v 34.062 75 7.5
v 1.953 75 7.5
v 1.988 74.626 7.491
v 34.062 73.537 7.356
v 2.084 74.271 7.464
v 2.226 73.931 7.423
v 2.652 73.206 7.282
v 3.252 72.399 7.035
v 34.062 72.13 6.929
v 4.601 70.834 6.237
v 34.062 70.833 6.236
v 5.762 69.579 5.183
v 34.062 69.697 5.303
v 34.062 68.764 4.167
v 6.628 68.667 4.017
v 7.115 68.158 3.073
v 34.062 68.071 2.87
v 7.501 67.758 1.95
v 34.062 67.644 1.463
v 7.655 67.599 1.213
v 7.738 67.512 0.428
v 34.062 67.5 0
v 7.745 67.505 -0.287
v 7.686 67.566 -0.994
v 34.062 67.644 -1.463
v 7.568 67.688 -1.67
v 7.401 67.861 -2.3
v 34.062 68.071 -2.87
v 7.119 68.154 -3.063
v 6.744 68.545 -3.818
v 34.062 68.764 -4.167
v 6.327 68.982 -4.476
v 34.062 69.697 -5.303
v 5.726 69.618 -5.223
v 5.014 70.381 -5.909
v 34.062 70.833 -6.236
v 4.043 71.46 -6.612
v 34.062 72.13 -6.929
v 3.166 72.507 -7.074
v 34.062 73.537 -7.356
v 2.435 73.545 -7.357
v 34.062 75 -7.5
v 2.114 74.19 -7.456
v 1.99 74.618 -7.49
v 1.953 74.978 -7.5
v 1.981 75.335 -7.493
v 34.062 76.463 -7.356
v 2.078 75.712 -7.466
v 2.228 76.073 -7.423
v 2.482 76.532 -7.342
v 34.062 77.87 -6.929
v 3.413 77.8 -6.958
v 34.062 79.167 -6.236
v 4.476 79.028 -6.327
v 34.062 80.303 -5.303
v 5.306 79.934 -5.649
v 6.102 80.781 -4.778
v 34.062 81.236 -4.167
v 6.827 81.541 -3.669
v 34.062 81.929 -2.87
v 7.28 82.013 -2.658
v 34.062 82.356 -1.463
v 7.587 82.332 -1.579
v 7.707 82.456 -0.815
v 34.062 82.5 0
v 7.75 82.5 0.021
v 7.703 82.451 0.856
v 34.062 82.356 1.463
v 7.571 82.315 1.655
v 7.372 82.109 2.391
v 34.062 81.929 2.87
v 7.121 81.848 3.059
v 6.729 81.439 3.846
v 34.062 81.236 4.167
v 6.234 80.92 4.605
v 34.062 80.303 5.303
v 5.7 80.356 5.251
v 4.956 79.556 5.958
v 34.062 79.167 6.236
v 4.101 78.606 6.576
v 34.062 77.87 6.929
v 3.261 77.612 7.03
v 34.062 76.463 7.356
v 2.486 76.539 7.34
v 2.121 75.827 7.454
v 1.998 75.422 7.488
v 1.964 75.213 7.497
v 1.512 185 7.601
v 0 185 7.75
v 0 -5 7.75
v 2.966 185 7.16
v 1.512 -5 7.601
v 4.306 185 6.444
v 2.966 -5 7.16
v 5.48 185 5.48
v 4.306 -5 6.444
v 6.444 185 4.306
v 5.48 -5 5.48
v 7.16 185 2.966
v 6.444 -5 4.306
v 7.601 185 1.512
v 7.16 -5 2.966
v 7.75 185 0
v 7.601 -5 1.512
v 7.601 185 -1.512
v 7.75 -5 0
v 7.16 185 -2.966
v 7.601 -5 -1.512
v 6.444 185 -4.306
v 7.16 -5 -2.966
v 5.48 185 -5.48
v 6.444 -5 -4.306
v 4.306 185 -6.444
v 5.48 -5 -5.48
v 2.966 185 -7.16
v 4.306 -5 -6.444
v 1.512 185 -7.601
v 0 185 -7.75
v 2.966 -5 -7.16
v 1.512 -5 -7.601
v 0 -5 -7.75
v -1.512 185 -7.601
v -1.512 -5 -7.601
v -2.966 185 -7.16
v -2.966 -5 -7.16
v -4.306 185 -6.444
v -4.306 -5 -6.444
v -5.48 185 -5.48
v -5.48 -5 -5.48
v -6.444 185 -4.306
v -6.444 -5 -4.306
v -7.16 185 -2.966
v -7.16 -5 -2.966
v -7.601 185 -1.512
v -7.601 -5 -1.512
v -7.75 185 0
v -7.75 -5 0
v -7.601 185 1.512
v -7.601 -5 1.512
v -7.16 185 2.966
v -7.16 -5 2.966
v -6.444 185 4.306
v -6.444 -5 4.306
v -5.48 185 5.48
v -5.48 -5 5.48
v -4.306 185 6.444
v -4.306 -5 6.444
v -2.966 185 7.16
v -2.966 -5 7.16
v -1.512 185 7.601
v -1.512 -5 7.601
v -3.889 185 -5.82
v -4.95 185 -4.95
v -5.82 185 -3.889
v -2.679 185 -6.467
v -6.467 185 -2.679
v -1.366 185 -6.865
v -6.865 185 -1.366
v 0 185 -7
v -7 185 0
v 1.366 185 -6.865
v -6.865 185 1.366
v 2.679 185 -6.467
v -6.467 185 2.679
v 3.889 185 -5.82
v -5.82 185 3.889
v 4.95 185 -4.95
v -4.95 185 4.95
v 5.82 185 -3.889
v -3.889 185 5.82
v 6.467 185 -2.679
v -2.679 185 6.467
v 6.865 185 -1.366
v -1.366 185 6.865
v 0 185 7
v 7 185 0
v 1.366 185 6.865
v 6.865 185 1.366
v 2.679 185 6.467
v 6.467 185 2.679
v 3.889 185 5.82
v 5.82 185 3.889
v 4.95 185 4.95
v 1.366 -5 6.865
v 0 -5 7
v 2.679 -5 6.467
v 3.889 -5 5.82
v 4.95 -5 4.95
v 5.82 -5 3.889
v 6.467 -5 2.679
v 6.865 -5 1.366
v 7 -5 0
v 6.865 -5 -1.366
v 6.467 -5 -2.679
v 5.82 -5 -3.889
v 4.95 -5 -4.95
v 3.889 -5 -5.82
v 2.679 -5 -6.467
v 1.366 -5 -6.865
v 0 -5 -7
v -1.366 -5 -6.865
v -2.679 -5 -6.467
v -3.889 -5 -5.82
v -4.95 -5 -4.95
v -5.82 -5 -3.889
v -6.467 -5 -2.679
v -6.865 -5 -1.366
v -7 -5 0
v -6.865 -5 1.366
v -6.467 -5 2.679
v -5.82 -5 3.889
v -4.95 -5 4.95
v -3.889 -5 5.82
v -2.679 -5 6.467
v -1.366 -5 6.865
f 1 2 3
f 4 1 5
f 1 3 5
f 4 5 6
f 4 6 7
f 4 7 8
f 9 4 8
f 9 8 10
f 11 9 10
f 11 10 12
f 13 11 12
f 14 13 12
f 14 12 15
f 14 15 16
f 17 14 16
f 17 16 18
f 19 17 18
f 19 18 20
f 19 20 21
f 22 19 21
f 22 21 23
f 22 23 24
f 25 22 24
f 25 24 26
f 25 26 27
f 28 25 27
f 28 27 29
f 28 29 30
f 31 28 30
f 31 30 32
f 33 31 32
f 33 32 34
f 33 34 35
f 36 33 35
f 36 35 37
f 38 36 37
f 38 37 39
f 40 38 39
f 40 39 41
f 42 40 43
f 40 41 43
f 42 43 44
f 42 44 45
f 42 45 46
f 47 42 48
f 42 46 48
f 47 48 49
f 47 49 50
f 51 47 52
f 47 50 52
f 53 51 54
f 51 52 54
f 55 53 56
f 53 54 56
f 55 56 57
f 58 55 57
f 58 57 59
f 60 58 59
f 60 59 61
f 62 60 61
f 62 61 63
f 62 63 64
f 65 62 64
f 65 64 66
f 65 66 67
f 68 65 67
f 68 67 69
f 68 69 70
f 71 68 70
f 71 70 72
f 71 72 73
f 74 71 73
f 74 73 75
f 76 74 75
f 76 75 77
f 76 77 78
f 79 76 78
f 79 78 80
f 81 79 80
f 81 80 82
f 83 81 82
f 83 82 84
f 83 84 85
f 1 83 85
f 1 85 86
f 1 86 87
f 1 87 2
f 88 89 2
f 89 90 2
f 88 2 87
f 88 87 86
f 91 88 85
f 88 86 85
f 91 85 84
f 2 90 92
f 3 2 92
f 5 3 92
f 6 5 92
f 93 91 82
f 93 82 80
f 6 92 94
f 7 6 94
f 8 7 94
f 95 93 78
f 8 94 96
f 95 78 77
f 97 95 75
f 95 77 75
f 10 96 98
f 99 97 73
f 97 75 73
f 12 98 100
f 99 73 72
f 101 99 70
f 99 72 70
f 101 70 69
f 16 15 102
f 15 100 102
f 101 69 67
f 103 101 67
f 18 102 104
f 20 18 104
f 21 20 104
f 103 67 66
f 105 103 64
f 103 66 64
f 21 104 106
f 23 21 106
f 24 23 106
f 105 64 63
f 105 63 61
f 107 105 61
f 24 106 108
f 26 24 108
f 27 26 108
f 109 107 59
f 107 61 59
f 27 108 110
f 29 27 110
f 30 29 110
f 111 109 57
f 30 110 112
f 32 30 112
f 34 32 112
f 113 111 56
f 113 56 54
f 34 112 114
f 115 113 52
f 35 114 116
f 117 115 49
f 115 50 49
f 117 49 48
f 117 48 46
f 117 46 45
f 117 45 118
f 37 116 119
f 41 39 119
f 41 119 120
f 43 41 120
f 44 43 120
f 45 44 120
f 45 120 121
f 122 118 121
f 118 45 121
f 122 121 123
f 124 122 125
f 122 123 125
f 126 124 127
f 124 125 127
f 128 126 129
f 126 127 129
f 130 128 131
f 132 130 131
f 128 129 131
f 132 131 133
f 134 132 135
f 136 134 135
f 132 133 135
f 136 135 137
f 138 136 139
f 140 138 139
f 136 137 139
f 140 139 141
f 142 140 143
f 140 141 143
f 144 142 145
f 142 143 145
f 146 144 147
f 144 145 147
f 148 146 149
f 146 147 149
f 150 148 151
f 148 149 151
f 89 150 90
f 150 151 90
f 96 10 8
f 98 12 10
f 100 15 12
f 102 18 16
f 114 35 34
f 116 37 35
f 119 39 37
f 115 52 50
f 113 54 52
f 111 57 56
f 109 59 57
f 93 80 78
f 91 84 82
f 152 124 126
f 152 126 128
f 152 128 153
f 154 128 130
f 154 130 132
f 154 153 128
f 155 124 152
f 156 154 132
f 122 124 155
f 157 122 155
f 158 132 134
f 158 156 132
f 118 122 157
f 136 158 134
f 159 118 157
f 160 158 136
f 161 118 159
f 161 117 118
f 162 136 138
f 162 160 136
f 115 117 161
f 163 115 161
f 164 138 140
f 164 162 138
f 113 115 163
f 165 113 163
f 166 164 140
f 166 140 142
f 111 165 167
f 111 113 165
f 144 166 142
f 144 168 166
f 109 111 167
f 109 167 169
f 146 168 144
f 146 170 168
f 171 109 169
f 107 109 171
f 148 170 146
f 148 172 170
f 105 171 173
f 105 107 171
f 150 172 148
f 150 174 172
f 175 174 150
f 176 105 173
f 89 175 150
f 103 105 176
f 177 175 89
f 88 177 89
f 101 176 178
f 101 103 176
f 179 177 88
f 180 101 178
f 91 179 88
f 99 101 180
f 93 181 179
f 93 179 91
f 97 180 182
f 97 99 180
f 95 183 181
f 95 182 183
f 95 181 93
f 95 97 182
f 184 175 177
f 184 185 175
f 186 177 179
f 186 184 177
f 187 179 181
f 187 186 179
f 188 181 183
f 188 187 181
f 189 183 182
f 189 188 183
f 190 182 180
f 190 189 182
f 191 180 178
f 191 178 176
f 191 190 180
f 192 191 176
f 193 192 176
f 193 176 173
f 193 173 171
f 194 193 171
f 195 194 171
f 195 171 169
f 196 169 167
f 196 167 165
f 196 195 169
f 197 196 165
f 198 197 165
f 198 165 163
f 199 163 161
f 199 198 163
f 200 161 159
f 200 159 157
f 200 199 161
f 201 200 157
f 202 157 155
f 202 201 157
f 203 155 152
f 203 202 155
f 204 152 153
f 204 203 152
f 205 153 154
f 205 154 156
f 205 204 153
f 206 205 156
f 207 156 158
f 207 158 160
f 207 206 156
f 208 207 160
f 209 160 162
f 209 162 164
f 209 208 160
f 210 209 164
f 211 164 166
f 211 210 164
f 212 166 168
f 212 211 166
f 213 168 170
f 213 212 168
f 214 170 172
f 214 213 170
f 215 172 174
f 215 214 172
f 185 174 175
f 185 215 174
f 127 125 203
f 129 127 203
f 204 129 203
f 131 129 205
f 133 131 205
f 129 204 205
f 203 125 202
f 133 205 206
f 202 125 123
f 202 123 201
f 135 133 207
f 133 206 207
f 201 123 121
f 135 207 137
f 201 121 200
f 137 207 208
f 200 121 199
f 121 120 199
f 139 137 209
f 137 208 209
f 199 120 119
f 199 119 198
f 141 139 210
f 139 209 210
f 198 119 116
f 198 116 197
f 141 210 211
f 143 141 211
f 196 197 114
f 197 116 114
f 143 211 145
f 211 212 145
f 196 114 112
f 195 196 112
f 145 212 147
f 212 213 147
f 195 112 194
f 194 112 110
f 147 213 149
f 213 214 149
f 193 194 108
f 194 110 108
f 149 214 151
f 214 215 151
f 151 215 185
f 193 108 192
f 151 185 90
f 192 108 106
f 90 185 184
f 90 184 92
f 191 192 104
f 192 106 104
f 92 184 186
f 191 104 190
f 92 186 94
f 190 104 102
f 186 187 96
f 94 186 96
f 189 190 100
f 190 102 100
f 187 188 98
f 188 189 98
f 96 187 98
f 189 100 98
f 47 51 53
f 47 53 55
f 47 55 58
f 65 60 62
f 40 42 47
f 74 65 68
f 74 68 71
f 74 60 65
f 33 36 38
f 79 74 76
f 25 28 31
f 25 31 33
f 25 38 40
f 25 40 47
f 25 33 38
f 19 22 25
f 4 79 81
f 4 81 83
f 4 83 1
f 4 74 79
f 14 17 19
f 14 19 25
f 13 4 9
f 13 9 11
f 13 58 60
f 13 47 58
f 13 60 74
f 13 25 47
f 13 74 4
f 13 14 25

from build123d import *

# Parameters (mm, degrees)
BOSS_EXTRUDE1_DEPTH      = 160
BOSS_EXTRUDE1_DEPTH_BACK = 5
SKETCH1_R                = 7.75
SKETCH1_R_2              = 7
SKETCH5_R                = 7.5
BOSS_EXTRUDE3_DEPTH      = 72.0622032
SKETCH7_R                = 7.75
SKETCH7_R_2              = 7
BOSS_EXTRUDE5_DEPTH      = 25
CUT_EXTRUDE1_START       = -38
SKETCH8_R                = 7.5
CUT_EXTRUDE1_DEPTH       = 38
SKETCH9_R                = 7
CUT_EXTRUDE2_DEPTH       = 105


with BuildPart() as part:
    # Sketch1 → Boss-Extrude1 (new, two sides: drawn at the far end of the back side and taken through both)
    with BuildSketch(Plane(origin=(0, 0, 0), x_dir=(1, 0, 0), z_dir=(0, 1, 0)).offset(-BOSS_EXTRUDE1_DEPTH_BACK)):
        with Locations(Location((0, 0, 0), (0, 0, 270))):
            Circle(SKETCH1_R)
        with Locations(Location((0, 0, 0), (0, 0, 270))):
            Circle(SKETCH1_R_2, mode=Mode.SUBTRACT)
    extrude(amount=BOSS_EXTRUDE1_DEPTH + BOSS_EXTRUDE1_DEPTH_BACK)

    # Sketch5 → Boss-Extrude3 (add)
    with BuildSketch(Plane(origin=(0, 0, 0), x_dir=(0, 0, -1), z_dir=(1, 0, 0))):
        with Locations(Location((0, 75, 0), (0, 0, 180))):
            Circle(SKETCH5_R)
    extrude(amount=BOSS_EXTRUDE3_DEPTH)

    # Sketch7 → Boss-Extrude5 (add)
    with BuildSketch(Plane(origin=(0, 160, 0), x_dir=(1, 0, 0), z_dir=(0, 1, 0))):
        with Locations(Location((0, 0, 0), (0, 0, 270))):
            Circle(SKETCH7_R)
        with Locations(Location((0, 0, 0), (0, 0, 270))):
            Circle(SKETCH7_R_2, mode=Mode.SUBTRACT)
    extrude(amount=BOSS_EXTRUDE5_DEPTH)

    # Sketch8 → Cut-Extrude1 (cut)
    with BuildSketch(Plane(origin=(72.0622032, 0, 0), x_dir=(0, 0, -1), z_dir=(1, 0, 0)).offset(CUT_EXTRUDE1_START)):
        with Locations(Location((0, 75, 0), (0, 0, 180))):
            Circle(SKETCH8_R)
    extrude(amount=CUT_EXTRUDE1_DEPTH, mode=Mode.SUBTRACT)

    # Sketch9 → Cut-Extrude2 (cut)
    with BuildSketch(Plane.XZ.offset(5)):
        with Locations(Location((0, 0, 0), (0, 0, 90))):
            Circle(SKETCH9_R)
    extrude(amount=-CUT_EXTRUDE2_DEPTH, mode=Mode.SUBTRACT)


solid = part.part
